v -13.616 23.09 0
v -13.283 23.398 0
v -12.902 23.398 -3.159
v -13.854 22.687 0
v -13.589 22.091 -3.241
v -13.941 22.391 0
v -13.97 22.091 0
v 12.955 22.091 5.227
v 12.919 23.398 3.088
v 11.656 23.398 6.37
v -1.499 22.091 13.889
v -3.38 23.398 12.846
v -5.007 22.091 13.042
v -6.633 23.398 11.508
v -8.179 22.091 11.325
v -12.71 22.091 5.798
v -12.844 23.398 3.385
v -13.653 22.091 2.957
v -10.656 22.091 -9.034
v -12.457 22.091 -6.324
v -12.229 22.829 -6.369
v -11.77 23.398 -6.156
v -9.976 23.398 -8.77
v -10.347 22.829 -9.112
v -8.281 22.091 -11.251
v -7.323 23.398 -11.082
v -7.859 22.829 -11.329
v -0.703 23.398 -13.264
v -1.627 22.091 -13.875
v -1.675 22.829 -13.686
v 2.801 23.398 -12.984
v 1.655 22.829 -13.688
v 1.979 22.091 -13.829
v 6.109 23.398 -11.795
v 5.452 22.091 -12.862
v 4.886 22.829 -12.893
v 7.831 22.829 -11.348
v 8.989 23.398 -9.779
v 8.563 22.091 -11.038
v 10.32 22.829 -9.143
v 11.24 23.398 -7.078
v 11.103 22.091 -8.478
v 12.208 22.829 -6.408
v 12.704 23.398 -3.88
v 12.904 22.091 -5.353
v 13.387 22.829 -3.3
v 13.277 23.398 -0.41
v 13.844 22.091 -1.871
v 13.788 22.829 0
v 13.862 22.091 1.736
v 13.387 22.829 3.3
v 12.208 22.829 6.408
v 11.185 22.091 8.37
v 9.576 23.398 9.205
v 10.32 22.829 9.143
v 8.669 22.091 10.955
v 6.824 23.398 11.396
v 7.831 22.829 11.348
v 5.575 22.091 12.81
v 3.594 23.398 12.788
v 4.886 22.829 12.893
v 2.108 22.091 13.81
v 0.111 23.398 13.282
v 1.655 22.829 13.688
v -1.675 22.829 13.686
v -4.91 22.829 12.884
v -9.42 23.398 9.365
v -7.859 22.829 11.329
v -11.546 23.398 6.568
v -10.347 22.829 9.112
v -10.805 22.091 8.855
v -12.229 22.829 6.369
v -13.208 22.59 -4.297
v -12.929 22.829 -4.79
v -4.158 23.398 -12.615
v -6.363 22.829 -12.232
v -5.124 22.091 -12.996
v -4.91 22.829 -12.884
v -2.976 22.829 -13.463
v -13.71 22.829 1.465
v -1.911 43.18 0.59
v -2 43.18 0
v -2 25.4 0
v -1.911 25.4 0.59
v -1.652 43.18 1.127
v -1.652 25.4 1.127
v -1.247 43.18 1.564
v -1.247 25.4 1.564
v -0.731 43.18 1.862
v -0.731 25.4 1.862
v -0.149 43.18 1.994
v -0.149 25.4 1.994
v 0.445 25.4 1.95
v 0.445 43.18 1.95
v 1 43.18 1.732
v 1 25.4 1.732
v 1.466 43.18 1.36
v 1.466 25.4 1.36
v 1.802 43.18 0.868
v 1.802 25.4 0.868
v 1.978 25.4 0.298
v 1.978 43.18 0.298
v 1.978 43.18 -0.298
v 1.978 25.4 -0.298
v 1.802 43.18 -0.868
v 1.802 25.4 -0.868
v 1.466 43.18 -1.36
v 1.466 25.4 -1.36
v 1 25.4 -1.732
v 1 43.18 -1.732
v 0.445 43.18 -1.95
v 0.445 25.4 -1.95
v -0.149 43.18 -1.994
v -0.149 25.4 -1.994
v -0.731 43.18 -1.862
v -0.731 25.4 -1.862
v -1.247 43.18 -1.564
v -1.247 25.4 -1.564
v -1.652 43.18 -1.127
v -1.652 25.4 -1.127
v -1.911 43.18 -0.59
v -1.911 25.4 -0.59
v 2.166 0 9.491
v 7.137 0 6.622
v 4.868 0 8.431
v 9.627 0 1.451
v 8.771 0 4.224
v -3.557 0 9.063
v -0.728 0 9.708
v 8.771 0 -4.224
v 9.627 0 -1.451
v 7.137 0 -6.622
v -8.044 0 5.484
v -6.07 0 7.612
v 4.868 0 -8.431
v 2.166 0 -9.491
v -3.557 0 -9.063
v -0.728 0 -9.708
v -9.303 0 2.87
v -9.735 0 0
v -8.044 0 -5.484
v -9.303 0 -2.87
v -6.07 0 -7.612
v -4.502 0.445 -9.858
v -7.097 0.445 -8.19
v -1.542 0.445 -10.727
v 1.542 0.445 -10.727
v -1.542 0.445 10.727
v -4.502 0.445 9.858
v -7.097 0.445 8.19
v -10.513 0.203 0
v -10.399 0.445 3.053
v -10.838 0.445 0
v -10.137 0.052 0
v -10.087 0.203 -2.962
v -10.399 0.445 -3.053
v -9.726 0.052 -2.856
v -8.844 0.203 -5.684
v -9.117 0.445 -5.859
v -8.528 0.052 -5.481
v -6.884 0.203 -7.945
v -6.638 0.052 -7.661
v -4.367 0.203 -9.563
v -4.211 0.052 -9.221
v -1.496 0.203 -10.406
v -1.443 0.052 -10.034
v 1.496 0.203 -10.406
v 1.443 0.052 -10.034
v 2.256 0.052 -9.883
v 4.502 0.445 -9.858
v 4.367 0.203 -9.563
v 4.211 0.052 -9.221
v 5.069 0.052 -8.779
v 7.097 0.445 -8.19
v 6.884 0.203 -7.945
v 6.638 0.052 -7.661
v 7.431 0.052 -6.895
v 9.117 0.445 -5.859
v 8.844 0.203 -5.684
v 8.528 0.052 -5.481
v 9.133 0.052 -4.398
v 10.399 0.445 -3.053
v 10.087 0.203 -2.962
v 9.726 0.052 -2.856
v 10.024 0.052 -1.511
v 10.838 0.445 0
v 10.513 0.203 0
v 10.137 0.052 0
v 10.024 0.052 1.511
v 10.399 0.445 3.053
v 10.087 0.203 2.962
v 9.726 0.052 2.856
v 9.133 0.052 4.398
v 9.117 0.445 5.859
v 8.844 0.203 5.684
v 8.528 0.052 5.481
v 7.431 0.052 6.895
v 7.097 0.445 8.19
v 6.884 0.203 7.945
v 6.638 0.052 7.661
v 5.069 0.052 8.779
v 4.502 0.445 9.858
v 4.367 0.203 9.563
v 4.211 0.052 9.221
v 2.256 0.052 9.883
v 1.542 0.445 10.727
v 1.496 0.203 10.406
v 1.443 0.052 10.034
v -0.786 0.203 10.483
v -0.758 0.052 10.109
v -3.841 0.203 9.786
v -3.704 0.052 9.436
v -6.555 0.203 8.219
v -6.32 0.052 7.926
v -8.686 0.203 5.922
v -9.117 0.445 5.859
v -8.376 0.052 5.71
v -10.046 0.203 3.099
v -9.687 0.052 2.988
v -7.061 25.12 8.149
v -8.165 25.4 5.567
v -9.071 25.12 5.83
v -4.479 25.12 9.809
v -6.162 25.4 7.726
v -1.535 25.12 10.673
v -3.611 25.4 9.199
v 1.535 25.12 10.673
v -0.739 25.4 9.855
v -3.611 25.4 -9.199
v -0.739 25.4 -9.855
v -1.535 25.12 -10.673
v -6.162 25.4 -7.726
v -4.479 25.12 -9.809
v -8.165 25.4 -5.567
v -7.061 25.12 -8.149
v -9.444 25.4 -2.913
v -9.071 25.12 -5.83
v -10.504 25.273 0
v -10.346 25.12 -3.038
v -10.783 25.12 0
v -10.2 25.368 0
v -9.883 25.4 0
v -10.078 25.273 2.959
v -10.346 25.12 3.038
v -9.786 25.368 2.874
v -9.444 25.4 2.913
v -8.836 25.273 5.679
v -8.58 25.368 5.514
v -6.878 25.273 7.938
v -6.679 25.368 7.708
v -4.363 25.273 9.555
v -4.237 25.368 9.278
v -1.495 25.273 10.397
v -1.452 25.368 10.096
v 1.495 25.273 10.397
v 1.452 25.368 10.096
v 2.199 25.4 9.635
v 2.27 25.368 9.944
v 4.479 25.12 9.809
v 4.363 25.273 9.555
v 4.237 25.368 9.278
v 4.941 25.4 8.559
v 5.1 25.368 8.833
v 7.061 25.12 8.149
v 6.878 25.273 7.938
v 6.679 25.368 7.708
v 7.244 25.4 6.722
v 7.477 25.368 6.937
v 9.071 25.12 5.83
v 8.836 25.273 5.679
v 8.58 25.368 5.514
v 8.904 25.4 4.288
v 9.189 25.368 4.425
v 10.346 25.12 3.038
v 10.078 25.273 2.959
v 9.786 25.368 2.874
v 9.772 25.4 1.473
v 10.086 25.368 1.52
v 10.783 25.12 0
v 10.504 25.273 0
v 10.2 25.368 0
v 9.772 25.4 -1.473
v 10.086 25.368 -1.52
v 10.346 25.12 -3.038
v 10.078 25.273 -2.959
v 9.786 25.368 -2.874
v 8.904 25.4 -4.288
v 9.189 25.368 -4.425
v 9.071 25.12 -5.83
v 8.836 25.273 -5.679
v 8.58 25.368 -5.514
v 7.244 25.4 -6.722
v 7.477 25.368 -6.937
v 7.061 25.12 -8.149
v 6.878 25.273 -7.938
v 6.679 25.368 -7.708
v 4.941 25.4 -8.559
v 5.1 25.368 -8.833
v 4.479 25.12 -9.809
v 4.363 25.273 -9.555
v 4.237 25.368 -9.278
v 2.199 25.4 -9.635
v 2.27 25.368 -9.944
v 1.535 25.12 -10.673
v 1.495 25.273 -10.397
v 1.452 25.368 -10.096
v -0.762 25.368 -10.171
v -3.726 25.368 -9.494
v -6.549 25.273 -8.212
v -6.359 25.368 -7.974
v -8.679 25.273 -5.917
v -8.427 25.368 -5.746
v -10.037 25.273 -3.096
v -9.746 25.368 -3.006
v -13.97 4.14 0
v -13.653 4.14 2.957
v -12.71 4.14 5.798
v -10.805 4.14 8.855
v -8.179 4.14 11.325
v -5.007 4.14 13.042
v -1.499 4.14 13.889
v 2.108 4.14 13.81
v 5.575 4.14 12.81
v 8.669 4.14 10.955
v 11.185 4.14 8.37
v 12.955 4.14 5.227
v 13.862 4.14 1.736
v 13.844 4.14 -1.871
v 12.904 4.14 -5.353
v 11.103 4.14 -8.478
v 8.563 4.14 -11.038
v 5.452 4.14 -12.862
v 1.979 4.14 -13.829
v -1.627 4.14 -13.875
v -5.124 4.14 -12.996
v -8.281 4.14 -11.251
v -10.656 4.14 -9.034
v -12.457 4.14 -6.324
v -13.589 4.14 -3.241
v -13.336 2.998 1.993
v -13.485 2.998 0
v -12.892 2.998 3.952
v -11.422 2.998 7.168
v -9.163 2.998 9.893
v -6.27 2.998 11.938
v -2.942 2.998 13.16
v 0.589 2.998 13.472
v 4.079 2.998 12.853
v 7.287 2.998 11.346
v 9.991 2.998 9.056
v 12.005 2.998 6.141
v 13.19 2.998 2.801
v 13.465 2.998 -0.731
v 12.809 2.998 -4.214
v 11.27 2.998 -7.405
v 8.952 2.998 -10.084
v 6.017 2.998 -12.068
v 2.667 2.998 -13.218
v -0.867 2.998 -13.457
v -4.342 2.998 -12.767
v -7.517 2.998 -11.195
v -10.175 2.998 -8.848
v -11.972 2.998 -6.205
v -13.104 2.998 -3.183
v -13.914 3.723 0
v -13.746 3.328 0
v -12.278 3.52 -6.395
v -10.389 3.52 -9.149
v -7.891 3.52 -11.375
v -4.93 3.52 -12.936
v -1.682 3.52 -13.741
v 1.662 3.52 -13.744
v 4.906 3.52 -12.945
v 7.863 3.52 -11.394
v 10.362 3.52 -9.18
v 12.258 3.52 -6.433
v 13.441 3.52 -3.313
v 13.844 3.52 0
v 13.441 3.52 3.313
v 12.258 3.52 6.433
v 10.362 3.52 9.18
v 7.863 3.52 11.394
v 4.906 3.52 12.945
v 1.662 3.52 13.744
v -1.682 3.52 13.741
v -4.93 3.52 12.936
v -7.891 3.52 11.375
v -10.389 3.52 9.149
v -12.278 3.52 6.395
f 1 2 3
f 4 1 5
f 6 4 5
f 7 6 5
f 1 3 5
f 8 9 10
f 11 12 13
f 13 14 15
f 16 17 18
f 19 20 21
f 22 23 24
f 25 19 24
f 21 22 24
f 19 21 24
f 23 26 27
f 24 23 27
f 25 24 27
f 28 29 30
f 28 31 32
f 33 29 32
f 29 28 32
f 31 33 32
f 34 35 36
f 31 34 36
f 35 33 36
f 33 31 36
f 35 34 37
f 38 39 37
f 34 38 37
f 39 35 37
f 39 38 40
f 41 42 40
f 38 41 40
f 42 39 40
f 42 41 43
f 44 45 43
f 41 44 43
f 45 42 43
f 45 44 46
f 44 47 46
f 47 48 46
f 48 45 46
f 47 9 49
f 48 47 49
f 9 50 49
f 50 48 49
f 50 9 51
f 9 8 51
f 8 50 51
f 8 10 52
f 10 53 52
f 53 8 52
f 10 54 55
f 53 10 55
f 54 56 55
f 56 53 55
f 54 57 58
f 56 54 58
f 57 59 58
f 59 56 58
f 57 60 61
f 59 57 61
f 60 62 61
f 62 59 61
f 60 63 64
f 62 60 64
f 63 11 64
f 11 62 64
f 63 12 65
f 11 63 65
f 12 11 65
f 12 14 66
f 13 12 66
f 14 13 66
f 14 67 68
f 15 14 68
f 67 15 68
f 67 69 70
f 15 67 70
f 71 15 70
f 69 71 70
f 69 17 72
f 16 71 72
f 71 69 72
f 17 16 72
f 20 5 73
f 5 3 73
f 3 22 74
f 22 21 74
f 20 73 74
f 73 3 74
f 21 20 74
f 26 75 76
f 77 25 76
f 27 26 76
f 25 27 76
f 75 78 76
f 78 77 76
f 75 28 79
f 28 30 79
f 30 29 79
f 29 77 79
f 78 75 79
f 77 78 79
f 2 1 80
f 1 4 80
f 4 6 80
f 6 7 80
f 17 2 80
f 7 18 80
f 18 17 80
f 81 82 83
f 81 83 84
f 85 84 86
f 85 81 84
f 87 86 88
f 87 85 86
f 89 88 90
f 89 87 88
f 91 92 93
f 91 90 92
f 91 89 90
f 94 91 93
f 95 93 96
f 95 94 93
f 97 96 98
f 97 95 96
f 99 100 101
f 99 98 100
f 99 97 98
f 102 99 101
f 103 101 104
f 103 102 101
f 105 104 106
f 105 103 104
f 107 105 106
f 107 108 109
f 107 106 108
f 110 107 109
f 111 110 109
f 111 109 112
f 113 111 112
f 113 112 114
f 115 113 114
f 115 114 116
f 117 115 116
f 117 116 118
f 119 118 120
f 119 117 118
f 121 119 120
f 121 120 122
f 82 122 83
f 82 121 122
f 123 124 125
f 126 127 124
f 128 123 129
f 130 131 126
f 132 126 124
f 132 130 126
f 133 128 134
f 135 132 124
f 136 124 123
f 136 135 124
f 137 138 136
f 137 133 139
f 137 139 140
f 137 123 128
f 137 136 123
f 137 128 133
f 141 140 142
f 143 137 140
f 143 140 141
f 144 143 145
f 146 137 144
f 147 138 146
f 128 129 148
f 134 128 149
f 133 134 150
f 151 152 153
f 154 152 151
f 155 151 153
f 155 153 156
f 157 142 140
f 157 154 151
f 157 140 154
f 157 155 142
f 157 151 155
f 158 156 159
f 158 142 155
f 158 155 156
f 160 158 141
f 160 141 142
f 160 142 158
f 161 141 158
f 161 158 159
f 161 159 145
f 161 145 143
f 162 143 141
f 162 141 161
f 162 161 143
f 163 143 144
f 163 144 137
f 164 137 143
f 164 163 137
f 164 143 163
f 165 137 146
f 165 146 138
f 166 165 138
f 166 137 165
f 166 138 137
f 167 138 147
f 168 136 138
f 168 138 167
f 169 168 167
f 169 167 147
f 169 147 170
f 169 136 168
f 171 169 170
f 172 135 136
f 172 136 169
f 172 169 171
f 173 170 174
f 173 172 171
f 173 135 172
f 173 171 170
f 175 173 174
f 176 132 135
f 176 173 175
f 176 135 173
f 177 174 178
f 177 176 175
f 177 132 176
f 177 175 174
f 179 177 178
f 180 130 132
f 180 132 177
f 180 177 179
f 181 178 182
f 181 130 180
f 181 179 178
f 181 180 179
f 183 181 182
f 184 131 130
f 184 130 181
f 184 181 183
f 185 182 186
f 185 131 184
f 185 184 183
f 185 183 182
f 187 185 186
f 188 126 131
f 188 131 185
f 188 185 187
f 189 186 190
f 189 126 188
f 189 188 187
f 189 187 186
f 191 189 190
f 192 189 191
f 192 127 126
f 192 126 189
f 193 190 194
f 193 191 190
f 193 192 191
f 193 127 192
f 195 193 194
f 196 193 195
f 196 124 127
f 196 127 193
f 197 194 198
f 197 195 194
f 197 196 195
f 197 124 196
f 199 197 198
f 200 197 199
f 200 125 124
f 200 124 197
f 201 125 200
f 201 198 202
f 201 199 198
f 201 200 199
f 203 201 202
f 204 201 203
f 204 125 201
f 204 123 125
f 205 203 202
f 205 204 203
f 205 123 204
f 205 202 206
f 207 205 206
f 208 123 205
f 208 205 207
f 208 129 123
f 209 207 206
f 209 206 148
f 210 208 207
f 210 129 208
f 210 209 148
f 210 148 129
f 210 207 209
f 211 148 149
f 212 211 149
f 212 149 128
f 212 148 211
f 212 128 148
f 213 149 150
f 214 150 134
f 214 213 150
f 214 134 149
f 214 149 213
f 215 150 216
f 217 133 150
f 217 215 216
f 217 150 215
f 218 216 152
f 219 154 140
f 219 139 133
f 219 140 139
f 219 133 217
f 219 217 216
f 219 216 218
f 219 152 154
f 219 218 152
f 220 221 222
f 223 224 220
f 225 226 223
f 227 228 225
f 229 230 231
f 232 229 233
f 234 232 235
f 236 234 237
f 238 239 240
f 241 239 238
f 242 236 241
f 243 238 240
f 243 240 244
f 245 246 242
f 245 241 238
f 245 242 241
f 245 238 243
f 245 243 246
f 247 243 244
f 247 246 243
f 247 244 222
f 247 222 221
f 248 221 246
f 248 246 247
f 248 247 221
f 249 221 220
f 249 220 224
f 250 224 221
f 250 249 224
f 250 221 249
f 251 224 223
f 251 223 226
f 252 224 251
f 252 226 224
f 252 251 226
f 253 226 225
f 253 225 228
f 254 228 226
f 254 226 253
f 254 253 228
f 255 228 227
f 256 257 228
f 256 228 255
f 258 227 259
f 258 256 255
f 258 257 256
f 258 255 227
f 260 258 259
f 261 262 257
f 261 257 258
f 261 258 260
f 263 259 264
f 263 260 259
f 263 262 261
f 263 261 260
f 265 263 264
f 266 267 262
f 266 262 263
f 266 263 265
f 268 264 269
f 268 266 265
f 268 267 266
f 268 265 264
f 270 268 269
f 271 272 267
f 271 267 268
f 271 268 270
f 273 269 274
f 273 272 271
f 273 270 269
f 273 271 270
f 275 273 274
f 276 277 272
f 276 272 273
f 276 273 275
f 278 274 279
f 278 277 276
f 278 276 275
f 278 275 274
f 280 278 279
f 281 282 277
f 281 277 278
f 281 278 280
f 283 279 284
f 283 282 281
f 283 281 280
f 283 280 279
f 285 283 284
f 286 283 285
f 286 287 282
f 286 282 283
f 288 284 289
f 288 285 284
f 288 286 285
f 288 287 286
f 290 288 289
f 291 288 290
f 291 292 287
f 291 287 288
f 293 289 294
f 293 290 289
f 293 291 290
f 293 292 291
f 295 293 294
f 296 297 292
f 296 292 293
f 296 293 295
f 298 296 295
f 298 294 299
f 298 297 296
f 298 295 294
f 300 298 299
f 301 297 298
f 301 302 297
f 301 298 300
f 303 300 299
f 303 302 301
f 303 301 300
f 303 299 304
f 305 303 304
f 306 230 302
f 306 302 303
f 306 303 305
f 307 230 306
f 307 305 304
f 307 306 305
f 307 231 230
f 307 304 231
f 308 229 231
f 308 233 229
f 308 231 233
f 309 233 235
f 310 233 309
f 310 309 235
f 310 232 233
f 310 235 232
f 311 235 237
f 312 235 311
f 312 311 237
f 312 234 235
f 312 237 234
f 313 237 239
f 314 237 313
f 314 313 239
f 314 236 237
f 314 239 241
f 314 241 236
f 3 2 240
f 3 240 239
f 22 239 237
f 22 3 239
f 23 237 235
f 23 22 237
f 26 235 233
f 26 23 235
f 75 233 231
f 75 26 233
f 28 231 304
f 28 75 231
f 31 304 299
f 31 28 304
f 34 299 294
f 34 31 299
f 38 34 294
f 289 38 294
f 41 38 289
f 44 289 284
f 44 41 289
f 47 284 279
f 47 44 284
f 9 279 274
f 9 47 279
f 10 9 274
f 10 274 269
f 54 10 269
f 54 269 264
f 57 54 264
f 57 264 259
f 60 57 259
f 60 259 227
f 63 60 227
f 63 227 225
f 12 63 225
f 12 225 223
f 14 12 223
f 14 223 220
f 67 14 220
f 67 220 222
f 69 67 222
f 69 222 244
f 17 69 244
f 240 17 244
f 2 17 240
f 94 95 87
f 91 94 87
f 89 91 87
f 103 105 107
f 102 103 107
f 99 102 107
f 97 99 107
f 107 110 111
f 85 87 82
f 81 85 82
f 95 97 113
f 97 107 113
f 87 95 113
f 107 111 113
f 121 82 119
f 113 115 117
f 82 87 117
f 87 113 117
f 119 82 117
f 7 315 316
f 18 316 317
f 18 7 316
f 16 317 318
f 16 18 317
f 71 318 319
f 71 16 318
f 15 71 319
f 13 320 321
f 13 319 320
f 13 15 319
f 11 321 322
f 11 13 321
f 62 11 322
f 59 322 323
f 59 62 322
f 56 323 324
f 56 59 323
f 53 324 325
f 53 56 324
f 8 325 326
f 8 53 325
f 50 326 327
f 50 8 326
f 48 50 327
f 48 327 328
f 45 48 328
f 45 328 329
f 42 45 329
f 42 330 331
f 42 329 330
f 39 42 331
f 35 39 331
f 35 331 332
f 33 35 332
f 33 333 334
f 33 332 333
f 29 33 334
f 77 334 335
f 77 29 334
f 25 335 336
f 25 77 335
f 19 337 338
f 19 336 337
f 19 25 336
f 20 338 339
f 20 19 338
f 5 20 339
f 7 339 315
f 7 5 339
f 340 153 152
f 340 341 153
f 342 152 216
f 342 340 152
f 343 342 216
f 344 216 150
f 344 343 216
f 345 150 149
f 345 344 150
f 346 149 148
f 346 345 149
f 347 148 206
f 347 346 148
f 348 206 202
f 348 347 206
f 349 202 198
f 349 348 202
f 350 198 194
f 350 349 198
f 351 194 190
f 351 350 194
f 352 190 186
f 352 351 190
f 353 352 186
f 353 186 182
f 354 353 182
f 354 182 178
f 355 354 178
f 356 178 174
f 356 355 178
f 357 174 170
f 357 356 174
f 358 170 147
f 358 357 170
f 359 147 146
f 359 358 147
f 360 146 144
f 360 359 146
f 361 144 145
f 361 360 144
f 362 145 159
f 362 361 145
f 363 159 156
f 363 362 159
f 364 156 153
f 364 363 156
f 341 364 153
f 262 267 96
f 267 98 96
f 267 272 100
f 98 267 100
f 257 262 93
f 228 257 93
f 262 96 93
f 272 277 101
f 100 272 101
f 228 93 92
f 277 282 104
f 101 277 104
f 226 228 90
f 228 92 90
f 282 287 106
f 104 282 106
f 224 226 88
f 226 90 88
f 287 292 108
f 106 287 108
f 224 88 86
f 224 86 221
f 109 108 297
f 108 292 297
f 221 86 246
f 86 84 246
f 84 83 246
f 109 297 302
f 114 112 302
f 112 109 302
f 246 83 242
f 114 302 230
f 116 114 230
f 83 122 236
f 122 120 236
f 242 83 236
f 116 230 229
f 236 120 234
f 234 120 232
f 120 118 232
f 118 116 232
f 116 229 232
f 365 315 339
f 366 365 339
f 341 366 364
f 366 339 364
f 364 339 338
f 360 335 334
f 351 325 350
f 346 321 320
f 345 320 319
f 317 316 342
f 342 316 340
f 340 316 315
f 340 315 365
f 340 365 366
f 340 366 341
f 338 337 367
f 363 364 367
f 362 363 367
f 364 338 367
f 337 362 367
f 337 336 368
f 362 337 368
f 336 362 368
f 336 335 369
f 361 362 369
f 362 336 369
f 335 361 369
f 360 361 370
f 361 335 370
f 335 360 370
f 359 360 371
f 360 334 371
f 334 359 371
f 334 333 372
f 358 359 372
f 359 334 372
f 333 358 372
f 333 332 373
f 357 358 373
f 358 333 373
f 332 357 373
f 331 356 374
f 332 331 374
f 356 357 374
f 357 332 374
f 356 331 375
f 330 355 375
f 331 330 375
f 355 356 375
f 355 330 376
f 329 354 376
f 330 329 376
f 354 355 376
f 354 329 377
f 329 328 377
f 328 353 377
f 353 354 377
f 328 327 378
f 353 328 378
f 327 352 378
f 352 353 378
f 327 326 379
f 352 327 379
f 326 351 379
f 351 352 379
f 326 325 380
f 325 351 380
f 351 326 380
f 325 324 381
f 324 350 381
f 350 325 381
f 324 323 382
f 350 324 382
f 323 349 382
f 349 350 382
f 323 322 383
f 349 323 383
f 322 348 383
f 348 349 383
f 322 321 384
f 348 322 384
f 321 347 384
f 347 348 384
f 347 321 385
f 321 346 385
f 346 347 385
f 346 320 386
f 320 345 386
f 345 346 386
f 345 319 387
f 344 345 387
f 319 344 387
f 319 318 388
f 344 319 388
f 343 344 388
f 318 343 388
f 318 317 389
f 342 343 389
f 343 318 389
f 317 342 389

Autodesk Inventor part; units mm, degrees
ref_plane "YZ Plane" through (0, 0, 0) normal (1, 0, 0) x (0, 1, 0)
ref_plane "XZ Plane" through (0, 0, 0) normal (0, 1, 0) x (-1, 0, 0)
ref_plane "XY Plane" through (0, 0, 0) normal (0, 0, 1) x (1, 0, 0)
sketch "Sketch1" plane through (0, 0, 0) normal (0, 0, 1) x (1, 0, 0)
  line L0 (0, 43.18) -> (0, 0)
  line L1 (-10.3763, 25.4) -> (-2, 25.4)
  line L2 (-2, 25.4) -> (-2, 43.18)
  line L3 (-2, 43.18) -> (0, 43.18)
  line L4 (0, 0) -> (-10.3763, 0)
  line L5 (-10.3763, 0) -> (-13.97, 3.466)
  line L6 (-13.97, 3.466) -> (-13.97, 22.9252)
  line L7 (-13.97, 22.9252) -> (-10.3763, 25.4)
  point P0 (0, 21.59)
  dimension "d18" = 2
  dimension "d19" = 17.78
  dimension "d23" = 25.4
  dimension "d25" = 13.97
revolve "Revolution1" add sketch "Sketch1" angle 360 about axis through (0, 43.18, 0) along (0, -1, 0)
fillet "Fillet3" radius 1.5875 1 edges at (10.3763, 25.4, 0)
fillet "Fillet4" radius 1.5875 1 edges at (13.97, 22.9252, 0)
fillet "Fillet5" radius 1.5875 2 edges at (13.97, 3.466, 0) (10.3763, 0, 0)
properties part number "MotorTop"
